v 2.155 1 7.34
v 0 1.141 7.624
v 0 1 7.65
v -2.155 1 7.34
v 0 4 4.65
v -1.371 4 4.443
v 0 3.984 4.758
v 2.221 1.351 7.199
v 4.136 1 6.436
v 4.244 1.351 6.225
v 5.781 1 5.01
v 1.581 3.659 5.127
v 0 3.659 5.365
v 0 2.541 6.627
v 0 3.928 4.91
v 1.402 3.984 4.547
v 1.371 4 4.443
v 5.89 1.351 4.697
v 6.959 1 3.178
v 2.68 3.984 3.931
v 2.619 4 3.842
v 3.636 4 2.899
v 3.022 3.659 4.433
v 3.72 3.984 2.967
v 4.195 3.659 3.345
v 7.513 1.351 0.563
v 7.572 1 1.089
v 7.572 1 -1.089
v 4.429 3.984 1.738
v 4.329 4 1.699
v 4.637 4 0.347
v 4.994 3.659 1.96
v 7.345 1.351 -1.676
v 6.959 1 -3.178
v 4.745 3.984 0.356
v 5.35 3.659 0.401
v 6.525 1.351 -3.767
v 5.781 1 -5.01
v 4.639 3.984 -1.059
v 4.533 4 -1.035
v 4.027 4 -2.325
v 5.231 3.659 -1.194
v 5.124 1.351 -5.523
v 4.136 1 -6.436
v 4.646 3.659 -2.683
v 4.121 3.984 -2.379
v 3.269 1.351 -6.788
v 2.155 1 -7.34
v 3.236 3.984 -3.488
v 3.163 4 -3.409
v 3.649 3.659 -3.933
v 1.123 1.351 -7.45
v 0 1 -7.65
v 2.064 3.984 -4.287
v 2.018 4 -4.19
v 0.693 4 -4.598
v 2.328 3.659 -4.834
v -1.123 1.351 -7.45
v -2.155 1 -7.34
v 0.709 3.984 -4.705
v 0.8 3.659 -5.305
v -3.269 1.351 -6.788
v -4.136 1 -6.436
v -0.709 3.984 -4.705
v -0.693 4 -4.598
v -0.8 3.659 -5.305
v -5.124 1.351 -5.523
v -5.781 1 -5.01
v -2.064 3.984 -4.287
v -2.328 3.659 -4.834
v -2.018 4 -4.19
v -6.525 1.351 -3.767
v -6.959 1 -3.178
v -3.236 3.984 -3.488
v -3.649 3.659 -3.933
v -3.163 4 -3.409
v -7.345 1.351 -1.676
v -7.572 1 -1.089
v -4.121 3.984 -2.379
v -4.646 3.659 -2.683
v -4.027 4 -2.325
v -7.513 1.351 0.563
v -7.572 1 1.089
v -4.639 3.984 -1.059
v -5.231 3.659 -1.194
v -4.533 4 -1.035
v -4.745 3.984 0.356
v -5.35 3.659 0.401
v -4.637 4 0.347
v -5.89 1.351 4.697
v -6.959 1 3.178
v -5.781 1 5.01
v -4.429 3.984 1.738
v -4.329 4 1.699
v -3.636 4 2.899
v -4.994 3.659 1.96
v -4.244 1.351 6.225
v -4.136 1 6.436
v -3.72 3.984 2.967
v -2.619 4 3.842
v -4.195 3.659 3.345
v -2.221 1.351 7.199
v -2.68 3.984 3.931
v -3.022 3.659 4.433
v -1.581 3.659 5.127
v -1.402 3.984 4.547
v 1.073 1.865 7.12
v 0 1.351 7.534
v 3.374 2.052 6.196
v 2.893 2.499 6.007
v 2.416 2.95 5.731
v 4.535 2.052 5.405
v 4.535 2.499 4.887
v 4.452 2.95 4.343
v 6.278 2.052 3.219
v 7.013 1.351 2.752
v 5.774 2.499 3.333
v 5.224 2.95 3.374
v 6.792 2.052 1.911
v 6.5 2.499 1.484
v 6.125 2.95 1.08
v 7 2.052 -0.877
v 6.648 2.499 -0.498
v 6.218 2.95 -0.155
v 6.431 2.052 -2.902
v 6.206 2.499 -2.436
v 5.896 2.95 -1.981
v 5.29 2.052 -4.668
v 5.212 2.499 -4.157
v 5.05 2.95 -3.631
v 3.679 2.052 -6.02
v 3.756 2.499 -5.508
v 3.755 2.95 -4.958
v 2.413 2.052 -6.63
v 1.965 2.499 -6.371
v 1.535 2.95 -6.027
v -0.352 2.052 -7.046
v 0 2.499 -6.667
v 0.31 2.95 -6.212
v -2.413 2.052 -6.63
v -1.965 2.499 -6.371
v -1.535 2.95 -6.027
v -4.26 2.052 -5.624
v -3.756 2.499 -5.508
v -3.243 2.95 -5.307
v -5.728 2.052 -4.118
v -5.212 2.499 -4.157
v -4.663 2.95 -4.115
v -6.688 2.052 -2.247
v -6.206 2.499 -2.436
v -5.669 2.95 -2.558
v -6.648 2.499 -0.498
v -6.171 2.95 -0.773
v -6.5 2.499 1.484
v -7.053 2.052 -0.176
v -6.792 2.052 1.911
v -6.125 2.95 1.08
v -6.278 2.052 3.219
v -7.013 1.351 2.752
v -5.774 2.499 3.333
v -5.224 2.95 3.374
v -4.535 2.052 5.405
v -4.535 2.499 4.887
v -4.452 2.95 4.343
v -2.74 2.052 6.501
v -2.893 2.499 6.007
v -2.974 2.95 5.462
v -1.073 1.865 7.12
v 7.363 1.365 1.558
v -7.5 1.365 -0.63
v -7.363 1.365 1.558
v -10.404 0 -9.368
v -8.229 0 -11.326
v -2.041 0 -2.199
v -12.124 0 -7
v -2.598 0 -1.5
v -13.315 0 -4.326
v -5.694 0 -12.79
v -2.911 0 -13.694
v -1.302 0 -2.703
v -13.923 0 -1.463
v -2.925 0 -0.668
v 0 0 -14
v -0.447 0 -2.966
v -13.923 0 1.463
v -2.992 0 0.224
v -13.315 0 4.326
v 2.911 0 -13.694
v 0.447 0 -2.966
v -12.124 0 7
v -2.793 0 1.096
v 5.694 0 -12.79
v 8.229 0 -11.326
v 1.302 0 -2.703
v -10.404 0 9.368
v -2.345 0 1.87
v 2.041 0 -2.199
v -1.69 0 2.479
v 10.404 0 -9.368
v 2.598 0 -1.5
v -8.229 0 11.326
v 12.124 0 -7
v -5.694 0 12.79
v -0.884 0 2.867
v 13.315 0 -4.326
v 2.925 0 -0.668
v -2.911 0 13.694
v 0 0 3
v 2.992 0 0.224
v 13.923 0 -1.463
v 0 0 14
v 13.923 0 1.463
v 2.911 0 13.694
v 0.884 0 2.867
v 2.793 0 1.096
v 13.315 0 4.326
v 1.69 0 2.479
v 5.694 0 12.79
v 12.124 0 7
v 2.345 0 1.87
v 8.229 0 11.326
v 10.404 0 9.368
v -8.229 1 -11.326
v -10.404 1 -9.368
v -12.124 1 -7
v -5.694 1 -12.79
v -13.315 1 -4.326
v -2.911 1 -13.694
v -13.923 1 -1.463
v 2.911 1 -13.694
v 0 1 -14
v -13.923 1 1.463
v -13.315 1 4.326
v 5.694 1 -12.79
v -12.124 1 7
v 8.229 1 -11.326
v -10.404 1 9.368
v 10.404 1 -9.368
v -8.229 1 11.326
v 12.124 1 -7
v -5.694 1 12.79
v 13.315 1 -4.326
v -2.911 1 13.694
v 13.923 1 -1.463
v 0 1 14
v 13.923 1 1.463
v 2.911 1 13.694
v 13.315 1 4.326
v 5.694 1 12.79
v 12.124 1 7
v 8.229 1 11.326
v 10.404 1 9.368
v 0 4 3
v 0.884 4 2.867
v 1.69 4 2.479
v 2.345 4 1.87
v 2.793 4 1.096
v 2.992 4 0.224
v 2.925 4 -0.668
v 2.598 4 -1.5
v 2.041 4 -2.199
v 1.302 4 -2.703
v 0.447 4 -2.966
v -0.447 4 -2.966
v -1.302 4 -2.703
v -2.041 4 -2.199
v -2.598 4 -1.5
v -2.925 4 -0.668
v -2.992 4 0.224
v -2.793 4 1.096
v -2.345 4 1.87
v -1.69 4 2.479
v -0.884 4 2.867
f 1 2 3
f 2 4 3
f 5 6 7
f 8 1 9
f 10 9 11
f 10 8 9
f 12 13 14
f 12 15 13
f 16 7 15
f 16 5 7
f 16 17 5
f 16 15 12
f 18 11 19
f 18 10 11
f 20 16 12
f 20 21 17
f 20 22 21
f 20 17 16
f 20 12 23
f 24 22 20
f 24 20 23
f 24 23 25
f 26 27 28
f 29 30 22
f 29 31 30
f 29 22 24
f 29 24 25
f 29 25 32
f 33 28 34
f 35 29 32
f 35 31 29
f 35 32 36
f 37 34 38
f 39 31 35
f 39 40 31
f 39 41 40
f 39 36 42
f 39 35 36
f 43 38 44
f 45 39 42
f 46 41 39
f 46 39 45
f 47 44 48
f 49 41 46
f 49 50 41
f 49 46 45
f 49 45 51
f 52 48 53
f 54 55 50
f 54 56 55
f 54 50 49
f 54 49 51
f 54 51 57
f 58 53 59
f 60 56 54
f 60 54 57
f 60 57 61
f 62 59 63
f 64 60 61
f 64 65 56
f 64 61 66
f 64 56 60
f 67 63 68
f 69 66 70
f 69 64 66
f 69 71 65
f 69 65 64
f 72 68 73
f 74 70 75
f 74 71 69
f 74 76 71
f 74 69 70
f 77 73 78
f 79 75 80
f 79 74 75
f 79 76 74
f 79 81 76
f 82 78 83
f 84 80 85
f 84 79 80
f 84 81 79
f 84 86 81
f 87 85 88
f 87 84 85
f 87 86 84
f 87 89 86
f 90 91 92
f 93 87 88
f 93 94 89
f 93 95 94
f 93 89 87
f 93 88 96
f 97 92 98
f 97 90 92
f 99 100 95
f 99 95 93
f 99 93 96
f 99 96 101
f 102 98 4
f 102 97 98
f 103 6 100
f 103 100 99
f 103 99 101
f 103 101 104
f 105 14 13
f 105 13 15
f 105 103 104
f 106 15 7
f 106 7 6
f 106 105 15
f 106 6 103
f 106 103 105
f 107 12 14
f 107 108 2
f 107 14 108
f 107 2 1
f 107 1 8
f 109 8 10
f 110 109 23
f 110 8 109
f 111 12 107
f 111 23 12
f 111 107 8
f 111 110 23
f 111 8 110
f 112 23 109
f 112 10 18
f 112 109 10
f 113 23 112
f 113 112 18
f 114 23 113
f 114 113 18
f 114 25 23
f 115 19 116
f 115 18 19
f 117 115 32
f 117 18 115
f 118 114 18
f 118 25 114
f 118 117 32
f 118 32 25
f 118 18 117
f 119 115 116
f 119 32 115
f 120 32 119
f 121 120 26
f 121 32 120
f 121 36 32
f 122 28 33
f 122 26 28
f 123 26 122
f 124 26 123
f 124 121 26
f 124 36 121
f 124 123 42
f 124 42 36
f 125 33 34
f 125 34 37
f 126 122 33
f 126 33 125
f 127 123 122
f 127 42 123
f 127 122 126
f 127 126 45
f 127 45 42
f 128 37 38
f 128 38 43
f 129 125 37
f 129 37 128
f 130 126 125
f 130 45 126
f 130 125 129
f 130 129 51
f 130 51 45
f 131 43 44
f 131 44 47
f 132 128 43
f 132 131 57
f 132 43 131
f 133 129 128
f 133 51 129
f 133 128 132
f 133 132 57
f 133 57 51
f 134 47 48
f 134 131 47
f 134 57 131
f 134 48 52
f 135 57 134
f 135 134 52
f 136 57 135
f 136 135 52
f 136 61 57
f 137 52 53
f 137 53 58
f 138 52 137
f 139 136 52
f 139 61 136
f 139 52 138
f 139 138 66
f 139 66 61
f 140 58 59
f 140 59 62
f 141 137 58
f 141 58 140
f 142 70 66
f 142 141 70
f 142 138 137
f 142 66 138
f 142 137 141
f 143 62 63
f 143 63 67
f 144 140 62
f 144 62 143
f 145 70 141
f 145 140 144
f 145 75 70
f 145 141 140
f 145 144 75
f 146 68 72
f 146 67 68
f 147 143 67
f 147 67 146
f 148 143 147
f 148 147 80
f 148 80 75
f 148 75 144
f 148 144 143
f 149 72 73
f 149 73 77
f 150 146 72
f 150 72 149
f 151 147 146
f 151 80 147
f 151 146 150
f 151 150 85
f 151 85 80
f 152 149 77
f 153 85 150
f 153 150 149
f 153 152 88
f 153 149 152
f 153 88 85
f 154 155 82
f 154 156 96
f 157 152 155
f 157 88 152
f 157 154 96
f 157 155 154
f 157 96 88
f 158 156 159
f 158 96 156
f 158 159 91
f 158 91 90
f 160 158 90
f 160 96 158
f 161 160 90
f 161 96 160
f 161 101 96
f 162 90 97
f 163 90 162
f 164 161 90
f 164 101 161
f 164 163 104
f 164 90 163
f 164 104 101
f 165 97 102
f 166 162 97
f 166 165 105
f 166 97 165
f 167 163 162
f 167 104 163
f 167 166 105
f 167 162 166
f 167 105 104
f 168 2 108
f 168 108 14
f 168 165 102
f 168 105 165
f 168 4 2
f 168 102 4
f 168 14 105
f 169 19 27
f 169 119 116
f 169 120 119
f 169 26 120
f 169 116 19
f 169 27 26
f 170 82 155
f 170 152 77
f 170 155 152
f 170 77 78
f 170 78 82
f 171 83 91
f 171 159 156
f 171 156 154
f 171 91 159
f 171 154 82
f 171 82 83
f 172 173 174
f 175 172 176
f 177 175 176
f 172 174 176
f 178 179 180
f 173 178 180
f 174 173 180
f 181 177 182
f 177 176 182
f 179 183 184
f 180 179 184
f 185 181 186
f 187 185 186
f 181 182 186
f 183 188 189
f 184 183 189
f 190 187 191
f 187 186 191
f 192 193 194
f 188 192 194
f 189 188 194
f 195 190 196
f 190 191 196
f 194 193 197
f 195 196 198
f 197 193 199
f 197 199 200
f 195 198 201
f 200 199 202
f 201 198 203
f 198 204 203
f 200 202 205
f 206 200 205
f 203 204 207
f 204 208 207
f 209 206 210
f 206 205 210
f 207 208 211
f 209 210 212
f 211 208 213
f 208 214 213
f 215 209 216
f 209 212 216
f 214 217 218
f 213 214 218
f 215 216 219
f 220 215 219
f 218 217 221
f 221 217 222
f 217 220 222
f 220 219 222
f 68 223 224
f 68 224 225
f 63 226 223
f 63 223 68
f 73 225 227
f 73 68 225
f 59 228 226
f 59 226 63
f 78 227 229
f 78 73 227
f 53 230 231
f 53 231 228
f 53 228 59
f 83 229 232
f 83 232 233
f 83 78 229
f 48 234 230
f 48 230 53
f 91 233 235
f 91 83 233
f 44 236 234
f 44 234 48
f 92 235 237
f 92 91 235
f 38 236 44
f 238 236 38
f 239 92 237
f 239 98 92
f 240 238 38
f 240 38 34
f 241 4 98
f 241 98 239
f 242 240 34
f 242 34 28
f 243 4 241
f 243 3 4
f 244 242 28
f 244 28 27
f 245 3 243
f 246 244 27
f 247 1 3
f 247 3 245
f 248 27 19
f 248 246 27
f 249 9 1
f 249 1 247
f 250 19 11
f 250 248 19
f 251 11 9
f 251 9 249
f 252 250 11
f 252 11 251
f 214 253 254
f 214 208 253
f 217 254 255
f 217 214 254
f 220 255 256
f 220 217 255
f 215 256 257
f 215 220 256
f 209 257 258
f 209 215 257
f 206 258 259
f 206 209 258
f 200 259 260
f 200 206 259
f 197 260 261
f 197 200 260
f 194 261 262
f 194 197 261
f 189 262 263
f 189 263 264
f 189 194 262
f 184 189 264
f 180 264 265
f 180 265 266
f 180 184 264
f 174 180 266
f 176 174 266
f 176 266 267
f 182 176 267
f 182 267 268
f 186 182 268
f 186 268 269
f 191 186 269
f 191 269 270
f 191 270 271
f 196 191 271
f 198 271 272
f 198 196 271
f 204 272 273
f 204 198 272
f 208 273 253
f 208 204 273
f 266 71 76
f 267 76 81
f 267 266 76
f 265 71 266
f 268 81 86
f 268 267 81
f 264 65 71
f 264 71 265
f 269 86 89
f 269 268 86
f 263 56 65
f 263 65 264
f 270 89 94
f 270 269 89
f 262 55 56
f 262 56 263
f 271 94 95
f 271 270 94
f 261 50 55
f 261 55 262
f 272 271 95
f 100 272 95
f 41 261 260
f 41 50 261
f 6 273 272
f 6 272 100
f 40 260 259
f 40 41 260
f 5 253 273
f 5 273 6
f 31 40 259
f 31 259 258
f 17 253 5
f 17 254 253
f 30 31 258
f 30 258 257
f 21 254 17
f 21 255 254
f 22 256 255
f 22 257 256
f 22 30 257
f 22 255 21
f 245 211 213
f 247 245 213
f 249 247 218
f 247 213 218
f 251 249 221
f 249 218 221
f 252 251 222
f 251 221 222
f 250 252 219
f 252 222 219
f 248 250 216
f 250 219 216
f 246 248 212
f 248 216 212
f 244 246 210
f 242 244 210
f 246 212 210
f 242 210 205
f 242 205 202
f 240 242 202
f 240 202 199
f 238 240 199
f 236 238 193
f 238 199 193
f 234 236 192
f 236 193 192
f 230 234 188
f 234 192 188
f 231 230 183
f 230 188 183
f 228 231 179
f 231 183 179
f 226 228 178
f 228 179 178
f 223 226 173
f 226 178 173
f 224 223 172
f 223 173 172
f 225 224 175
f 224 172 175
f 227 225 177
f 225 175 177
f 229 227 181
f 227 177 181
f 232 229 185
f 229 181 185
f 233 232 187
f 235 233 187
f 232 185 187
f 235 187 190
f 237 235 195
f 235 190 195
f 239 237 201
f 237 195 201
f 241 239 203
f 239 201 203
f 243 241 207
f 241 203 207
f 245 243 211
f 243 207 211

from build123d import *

# Parameters (mm, degrees)
ESQUISSE1_R        = 14
ESQUISSE1_R_2      = 3
BOSS_EXTRU_1_DEPTH = 1
ESQUISSE2_R        = 7.65
ESQUISSE2_R_2      = 3
BOSS_EXTRU_2_DEPTH = 3
CONG_1_SIZE        = 3


with BuildPart() as part:
    # Esquisse1 → Boss.-Extru.1 (new body)
    with BuildSketch(Plane(origin=(0, 0, 0), x_dir=(1, 0, 0), z_dir=(0, 1, 0))):
        with Locations(Location((0, 0, 0), (0, 0, 270))):
            Circle(ESQUISSE1_R)
        with Locations(Location((0, 0, 0), (0, 0, 270))):
            Circle(ESQUISSE1_R_2, mode=Mode.SUBTRACT)
    extrude(amount=BOSS_EXTRU_1_DEPTH)

    # Esquisse2 → Boss.-Extru.2 (add)
    with BuildSketch(Plane(origin=(0, 1, 0), x_dir=(1, 0, 0), z_dir=(0, 1, 0))):
        with Locations(Location((0, 0, 0), (0, 0, 270))):
            Circle(ESQUISSE2_R)
        with Locations(Location((0, 0, 0), (0, 0, 270))):
            Circle(ESQUISSE2_R_2, mode=Mode.SUBTRACT)
    extrude(amount=BOSS_EXTRU_2_DEPTH)

    # Congé1
    # a fillet whose section is not a circle: 3 mm, written as the material it takes off along each edge
    with BuildSketch(Plane(origin=(0, 4, 0), x_dir=(0, 0, 1), z_dir=(-1, 0, 0))) as cong_1_piece_1:
        with BuildLine():
            Bezier((7.65, -CONG_1_SIZE), (7.65, 0), (7.65 - CONG_1_SIZE, 0), weights=[1, 0.212132034, 1])
            Line((7.65 - CONG_1_SIZE, 0), (7.65, 0))
            Line((7.65, 0), (7.65, -CONG_1_SIZE))
        make_face()
    revolve(axis=Axis((0, 4, 0), (0, 1, 0)), mode=Mode.SUBTRACT)


solid = part.part
